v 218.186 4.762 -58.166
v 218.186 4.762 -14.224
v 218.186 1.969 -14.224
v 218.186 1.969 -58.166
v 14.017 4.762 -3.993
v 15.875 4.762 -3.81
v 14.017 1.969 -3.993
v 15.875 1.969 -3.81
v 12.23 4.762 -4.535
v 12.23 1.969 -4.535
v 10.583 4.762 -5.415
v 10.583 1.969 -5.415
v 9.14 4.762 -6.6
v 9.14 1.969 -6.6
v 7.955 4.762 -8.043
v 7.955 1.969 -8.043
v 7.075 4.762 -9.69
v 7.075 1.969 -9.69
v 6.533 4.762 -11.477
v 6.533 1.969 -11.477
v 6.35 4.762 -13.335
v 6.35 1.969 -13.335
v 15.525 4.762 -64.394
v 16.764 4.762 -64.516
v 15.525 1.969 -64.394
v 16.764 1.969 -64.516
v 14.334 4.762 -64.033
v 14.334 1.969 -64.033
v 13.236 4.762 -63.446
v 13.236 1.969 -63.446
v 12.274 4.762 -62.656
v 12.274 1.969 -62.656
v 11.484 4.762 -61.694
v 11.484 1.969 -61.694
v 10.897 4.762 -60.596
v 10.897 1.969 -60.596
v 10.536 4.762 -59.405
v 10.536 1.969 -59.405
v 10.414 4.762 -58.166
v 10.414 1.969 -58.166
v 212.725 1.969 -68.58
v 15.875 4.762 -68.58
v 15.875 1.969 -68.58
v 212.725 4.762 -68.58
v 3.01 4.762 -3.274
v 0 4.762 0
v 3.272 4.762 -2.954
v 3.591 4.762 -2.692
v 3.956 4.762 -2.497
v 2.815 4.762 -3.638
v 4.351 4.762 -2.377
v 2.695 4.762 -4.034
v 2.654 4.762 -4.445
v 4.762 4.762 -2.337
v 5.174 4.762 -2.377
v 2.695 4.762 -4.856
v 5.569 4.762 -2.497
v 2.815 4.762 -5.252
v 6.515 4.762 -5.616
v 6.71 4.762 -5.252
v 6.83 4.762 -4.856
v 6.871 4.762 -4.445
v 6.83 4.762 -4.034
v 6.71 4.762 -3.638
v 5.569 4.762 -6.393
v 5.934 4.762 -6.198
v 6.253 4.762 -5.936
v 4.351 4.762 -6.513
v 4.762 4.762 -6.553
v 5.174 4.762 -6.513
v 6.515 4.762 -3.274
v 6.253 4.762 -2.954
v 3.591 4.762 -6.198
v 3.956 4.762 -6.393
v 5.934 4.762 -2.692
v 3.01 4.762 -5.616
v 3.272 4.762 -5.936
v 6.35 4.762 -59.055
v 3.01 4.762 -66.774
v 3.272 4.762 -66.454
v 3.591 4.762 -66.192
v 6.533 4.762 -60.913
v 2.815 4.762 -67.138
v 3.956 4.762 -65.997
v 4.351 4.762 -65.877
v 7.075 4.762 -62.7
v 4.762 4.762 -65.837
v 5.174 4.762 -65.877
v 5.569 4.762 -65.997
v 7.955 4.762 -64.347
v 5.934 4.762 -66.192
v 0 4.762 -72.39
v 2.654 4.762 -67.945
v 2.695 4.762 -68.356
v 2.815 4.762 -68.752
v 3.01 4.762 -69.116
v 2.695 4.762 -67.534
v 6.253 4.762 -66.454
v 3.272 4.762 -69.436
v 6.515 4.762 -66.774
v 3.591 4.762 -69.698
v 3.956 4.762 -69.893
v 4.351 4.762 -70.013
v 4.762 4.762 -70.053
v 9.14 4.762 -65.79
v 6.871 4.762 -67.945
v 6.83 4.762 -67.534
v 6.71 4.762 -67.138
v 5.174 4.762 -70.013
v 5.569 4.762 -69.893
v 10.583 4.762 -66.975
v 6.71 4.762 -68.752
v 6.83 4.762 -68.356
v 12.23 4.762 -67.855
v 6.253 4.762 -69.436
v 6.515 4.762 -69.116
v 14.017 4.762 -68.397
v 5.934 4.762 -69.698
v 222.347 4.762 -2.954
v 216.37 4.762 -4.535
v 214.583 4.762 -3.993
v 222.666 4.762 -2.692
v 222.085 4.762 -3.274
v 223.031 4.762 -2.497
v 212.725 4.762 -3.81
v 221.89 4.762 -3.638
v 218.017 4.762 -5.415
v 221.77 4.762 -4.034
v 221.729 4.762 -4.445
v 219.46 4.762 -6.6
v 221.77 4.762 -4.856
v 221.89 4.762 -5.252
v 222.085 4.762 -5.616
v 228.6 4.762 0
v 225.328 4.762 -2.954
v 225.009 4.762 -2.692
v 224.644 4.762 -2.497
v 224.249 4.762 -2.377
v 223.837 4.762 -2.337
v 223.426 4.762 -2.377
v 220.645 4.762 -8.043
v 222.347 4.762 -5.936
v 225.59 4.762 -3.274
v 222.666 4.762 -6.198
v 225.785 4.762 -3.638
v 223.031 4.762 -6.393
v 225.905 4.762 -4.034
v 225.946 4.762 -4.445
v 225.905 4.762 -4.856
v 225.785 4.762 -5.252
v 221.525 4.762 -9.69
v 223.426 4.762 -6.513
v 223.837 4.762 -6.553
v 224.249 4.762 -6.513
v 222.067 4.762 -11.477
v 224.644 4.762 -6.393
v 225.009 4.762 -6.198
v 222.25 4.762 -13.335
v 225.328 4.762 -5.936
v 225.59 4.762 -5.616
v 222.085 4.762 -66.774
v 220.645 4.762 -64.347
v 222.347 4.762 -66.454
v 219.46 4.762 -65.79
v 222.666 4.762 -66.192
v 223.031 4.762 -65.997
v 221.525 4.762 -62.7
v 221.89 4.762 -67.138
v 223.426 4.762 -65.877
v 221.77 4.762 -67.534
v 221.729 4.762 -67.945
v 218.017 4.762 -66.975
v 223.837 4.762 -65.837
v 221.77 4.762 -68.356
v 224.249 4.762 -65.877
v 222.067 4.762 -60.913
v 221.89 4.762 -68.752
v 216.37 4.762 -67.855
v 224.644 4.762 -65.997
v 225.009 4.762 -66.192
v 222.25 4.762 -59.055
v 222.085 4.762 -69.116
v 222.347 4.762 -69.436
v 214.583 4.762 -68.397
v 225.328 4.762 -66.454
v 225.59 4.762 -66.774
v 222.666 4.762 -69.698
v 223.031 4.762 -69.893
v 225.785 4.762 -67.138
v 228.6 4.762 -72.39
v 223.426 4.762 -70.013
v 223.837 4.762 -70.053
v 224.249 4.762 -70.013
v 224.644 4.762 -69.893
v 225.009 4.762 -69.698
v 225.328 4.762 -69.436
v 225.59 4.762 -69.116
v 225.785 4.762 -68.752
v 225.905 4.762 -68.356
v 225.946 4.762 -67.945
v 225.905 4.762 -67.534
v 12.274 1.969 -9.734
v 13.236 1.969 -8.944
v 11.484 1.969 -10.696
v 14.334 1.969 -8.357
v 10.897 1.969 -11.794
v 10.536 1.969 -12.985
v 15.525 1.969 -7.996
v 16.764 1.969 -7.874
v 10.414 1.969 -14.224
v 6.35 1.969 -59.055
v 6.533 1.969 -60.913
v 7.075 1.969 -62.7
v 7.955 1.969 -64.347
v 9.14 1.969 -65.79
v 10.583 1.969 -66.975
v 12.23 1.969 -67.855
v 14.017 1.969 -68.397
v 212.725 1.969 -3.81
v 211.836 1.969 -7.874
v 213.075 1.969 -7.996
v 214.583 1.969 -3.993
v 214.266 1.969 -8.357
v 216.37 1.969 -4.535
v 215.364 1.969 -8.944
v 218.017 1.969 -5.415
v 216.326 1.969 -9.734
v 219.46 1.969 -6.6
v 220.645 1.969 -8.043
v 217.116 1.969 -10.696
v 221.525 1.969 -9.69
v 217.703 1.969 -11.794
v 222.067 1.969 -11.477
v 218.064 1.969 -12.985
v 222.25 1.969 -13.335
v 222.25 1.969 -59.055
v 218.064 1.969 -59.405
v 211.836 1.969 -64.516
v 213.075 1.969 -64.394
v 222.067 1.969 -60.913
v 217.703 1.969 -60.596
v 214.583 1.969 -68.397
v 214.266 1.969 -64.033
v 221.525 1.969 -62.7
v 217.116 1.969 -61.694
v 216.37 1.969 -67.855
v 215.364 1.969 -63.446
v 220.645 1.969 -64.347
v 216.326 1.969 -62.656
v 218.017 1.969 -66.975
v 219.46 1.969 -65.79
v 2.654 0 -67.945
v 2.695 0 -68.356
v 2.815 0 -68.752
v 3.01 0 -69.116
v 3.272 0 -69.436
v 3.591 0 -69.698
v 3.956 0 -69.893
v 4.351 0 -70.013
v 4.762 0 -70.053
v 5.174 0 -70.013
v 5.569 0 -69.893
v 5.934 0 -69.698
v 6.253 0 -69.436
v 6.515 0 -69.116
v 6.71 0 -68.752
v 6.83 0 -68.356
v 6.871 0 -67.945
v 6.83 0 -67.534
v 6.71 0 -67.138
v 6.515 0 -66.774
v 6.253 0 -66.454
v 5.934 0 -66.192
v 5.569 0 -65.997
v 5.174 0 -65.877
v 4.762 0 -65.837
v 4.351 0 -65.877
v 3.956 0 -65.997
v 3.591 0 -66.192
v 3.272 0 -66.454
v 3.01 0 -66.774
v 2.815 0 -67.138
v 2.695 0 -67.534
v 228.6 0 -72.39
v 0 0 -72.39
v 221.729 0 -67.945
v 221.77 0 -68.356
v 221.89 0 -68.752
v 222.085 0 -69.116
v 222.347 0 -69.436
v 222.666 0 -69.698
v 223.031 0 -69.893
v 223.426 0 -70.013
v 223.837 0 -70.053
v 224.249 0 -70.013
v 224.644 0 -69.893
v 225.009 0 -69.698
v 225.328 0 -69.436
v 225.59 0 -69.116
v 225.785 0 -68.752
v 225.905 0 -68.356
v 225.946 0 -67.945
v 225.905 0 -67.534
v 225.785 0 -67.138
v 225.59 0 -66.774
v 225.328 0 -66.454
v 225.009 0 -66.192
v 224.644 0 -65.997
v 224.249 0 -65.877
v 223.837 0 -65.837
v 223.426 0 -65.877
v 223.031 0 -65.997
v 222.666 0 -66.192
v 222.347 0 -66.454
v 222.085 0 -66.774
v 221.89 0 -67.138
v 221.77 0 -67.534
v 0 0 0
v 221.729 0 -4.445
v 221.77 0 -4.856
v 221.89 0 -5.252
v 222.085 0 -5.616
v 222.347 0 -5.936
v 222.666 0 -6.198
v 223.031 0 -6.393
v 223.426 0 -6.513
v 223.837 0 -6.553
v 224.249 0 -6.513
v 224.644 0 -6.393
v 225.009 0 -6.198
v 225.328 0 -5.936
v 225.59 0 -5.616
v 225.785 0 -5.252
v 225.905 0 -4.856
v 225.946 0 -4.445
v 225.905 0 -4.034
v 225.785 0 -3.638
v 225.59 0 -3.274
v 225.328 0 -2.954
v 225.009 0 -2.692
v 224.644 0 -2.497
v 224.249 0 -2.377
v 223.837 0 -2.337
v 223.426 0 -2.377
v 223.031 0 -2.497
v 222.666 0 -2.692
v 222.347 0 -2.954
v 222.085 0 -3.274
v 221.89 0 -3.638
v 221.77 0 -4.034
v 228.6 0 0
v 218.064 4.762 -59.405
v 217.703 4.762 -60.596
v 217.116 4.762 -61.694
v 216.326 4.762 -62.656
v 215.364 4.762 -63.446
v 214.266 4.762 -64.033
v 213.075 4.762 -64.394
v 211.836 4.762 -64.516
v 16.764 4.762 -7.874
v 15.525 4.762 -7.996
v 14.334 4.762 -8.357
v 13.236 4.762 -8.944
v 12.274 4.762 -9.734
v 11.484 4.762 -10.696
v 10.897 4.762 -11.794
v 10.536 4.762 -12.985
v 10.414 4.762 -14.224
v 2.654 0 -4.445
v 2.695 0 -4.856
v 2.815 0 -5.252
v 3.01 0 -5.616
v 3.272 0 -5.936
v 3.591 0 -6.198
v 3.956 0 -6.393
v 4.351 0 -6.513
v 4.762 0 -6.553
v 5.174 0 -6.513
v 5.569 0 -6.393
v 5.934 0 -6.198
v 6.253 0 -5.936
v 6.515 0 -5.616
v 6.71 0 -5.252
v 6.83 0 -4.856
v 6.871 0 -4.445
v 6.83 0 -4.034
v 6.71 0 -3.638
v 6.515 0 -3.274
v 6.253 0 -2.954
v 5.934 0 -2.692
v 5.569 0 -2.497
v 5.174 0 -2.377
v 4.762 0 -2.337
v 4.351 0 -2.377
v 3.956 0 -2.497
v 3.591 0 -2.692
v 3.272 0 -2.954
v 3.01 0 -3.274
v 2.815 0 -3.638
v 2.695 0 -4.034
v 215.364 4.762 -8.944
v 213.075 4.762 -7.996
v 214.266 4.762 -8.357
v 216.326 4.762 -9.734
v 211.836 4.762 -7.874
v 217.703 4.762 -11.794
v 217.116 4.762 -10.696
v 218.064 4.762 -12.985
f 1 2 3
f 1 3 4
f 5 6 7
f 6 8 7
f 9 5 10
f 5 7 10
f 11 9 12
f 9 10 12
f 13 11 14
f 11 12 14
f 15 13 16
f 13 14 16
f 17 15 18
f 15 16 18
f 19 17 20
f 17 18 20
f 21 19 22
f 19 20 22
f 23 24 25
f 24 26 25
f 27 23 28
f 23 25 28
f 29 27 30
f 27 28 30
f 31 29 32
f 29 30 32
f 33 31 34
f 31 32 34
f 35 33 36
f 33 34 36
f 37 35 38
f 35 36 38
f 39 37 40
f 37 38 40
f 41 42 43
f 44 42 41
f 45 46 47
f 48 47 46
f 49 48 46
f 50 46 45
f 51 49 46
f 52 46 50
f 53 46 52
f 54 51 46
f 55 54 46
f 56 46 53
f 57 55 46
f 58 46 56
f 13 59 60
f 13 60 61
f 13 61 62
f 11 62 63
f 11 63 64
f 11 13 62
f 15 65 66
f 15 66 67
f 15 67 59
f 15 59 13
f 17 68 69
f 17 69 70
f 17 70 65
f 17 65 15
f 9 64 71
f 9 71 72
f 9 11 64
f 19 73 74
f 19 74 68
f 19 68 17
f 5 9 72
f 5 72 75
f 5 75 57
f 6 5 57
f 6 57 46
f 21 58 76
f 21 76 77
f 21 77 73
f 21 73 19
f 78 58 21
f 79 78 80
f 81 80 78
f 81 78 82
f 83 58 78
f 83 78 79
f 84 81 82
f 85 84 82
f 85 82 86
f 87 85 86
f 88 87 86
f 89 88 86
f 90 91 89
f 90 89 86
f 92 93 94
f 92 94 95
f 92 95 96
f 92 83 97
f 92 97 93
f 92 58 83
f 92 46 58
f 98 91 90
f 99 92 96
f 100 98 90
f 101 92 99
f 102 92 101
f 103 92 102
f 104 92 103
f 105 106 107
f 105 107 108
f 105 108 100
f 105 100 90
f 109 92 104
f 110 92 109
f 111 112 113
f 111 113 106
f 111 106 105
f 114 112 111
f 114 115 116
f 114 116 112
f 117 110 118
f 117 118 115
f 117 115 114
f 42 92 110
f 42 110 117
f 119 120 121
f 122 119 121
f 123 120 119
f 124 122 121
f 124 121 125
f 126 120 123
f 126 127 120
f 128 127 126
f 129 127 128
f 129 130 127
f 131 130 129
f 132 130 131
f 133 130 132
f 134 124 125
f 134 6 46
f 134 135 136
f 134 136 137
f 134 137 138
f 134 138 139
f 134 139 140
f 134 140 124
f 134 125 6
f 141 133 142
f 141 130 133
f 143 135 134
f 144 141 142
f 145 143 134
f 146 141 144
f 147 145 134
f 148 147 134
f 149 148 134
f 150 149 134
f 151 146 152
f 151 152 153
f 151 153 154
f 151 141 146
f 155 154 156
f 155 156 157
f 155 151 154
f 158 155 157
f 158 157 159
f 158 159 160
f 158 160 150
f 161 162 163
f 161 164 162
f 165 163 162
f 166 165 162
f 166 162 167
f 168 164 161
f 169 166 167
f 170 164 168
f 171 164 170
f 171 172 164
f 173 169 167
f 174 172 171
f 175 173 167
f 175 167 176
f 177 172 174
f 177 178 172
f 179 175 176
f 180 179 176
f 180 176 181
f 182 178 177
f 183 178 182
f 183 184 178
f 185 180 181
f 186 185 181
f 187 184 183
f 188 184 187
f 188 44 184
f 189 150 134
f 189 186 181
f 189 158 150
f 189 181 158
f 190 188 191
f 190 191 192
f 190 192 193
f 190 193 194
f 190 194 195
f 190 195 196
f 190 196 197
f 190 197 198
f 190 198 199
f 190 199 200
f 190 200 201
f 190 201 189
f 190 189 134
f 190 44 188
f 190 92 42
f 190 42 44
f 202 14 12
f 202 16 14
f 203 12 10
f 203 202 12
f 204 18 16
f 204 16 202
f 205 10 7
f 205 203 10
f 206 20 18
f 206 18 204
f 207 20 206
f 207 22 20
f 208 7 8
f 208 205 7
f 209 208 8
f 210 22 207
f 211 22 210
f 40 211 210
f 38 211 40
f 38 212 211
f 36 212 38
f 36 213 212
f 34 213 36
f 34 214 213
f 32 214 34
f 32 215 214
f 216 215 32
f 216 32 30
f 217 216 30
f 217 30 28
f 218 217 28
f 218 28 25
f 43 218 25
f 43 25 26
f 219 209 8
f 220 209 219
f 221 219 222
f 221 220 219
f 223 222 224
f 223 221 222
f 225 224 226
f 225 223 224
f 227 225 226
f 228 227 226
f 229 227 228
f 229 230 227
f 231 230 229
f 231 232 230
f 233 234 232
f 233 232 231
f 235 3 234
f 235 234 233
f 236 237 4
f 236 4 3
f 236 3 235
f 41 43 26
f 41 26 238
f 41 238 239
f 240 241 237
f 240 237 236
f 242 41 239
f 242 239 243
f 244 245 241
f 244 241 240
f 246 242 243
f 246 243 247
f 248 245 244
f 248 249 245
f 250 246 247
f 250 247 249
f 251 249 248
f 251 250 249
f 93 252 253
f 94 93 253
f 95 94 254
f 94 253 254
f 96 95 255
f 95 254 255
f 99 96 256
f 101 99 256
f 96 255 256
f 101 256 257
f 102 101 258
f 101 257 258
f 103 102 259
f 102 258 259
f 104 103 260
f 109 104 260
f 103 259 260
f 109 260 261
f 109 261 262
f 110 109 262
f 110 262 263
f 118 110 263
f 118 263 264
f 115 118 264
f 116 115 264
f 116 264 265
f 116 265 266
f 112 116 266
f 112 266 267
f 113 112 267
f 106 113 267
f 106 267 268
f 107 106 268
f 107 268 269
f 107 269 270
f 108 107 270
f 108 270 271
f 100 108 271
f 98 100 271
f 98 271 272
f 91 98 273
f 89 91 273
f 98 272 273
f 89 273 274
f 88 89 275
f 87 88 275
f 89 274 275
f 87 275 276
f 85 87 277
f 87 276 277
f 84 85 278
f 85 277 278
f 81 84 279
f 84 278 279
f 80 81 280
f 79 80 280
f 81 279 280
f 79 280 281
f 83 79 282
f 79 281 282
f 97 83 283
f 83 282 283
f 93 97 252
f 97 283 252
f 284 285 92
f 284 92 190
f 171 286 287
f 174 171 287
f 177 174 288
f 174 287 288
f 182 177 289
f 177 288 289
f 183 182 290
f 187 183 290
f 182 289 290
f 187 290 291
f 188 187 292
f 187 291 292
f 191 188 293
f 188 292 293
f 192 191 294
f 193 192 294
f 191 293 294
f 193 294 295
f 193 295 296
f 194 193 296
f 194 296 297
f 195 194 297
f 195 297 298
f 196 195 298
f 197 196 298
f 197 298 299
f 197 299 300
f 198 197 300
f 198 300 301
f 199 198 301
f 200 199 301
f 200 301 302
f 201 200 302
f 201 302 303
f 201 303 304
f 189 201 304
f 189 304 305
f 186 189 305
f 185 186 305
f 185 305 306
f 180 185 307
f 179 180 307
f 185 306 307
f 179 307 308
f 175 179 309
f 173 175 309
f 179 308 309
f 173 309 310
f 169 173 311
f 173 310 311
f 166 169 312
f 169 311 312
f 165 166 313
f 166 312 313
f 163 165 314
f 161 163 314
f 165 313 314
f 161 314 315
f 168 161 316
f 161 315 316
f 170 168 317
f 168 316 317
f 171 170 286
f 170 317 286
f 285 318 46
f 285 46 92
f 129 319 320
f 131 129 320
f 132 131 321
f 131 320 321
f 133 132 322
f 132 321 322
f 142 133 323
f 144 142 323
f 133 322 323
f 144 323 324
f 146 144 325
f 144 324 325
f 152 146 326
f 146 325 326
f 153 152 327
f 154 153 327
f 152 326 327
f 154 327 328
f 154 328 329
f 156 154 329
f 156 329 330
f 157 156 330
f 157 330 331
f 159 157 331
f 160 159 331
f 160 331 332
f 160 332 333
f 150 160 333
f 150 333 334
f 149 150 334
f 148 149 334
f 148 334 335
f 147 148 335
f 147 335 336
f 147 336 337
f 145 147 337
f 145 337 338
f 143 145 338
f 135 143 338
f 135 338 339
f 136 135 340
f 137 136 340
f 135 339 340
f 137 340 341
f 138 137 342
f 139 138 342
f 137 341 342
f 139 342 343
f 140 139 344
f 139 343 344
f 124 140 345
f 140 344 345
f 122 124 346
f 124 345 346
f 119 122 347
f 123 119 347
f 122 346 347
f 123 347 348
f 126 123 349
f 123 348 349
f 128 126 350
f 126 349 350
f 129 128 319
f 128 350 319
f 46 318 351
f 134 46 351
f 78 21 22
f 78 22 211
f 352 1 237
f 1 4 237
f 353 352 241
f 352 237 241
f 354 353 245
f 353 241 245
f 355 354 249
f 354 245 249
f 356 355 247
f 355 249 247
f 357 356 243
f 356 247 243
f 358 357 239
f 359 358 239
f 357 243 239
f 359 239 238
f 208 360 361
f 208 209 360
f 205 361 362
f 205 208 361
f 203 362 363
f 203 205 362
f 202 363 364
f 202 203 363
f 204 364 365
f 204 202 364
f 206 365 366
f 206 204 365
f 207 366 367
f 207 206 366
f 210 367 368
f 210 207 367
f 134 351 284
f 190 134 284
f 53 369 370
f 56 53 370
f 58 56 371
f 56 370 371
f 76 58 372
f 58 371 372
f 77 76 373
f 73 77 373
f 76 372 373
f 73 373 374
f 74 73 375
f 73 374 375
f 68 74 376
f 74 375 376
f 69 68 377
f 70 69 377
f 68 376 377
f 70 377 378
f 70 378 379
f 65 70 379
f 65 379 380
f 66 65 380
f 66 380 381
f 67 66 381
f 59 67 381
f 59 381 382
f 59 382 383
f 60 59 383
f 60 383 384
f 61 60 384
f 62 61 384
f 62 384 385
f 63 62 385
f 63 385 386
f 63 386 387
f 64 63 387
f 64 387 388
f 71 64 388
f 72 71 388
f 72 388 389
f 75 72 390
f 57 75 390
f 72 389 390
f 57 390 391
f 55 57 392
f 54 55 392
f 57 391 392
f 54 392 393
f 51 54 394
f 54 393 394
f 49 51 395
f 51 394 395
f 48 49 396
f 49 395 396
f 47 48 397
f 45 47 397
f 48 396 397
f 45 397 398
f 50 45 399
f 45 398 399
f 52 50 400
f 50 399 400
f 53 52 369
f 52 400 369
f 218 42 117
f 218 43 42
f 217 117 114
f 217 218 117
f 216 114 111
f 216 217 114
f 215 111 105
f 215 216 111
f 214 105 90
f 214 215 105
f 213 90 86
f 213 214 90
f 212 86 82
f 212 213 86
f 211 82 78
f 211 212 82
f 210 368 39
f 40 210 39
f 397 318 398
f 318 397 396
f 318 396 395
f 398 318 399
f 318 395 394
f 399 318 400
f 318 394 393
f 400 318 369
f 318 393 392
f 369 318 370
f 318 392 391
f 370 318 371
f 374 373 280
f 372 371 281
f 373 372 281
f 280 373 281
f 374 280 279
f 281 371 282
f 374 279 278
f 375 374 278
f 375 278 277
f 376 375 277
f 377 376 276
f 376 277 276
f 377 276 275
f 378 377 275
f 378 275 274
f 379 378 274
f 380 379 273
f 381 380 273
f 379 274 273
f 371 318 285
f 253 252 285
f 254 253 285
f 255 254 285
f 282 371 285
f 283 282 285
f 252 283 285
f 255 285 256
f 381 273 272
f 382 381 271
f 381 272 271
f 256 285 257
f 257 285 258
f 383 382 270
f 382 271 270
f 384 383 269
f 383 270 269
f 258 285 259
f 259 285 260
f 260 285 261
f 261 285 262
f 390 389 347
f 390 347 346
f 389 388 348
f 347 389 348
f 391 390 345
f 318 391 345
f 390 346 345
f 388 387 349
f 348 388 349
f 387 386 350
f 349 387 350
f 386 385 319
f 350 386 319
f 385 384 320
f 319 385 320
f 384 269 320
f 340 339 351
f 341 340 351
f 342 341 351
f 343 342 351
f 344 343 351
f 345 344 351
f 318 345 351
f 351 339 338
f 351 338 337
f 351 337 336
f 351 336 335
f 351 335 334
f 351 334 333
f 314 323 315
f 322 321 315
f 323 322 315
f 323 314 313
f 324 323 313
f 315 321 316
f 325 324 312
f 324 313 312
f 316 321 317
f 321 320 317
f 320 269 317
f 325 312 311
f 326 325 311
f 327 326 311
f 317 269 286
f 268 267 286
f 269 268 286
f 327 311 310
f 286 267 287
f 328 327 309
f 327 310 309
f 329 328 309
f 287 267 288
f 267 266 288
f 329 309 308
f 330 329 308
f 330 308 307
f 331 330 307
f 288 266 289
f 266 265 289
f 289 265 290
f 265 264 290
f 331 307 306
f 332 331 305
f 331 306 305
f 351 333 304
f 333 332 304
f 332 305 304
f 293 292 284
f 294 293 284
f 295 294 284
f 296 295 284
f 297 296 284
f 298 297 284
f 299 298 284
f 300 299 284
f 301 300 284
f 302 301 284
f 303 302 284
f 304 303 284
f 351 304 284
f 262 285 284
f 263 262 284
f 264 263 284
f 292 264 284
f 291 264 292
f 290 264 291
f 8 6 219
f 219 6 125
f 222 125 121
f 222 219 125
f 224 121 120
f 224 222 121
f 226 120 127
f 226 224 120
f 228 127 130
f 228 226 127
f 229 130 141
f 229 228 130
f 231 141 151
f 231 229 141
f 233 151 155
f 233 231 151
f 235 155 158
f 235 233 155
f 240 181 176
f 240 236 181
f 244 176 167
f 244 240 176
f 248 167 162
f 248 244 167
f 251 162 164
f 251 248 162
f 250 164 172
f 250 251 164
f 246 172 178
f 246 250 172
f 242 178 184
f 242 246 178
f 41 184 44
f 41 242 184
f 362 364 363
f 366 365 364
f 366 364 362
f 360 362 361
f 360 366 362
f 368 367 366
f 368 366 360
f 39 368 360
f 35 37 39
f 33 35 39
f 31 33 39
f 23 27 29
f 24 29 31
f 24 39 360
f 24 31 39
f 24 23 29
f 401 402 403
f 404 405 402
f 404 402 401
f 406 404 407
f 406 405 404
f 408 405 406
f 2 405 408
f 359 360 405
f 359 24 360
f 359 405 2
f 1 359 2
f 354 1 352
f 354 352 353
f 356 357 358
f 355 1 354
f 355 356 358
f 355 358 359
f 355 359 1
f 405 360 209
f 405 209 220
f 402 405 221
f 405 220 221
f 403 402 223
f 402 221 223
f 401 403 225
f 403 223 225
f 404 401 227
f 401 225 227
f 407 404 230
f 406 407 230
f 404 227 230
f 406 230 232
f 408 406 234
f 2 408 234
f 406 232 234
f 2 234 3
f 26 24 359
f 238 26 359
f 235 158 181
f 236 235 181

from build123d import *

# Parameters (mm, degrees)
SKETCH1_W                   = 228.6
SKETCH1_H                   = 72.39
BOSS_EXTRUDE1_DEPTH         = 4.7625
SKETCH2_W                   = 215.9
SKETCH2_H                   = 64.77
SKETCH2_W_2                 = 207.772
SKETCH2_H_2                 = 56.642
CUT_EXTRUDE1_DEPTH          = 2.794
FILLET1_R                   = 9.525
FILLET2_R                   = 6.35
F_19_0_166_DIAMETER_HOLE1_D = 4.2164
LPATTERN1_COUNT             = 2
LPATTERN1_PITCH             = 219.075
LPATTERN1_COUNT_DIR2        = 2
LPATTERN1_PITCH_DIR2        = 63.5


with BuildPart() as part:
    # Sketch1 → Boss-Extrude1 (new body)
    with BuildSketch(Plane(origin=(0, 0, 0), x_dir=(1, 0, 0), z_dir=(0, 1, 0))):
        with Locations((114.3, 36.195)):
            Rectangle(SKETCH1_W, SKETCH1_H)
    extrude(amount=BOSS_EXTRUDE1_DEPTH)

    # Sketch2 → Cut-Extrude1 (cut)
    with BuildSketch(Plane(origin=(0, 4.7625, 0), x_dir=(1, 0, 0), z_dir=(0, 1, 0))):
        with Locations((114.3, 36.195)):
            Rectangle(SKETCH2_W, SKETCH2_H)
        with Locations((114.3, 36.195)):
            Rectangle(SKETCH2_W_2, SKETCH2_H_2, mode=Mode.SUBTRACT)
    extrude(amount=-CUT_EXTRUDE1_DEPTH, mode=Mode.SUBTRACT)

    # Fillet1
    fillet1_edges = [part.edges().sort_by_distance(p)[0] for p in [
        (6.35, 3.3655, -3.81),
        (6.35, 3.3655, -68.58),
        (222.25, 3.3655, -68.58),
        (222.25, 3.3655, -3.81),
    ]]
    fillet(fillet1_edges, radius=FILLET1_R)

    # Fillet2
    fillet2_edges = [part.edges().sort_by_distance(p)[0] for p in [
        (10.414, 3.3655, -64.516),
        (218.186, 3.3655, -64.516),
        (218.186, 3.3655, -7.874),
        (10.414, 3.3655, -7.874),
    ]]
    fillet(fillet2_edges, radius=FILLET2_R)

    # #19 (0.166) Diameter Hole1 (through all)
    with Locations(Plane(origin=(0, 4.7625, 0), x_dir=(1, 0, 0), z_dir=(0, 1, 0))):
        with Locations((4.7625, 4.445)):
            f_19_0_166_diameter_hole1 = Hole(F_19_0_166_DIAMETER_HOLE1_D / 2)

    # LPattern1: 19 _0.166_ Diameter Hole1 2 × 2
    with Locations(*[(i * LPATTERN1_PITCH, 0, -j * LPATTERN1_PITCH_DIR2) for i in range(LPATTERN1_COUNT) for j in range(LPATTERN1_COUNT_DIR2) if (i, j) != (0, 0)]):
        add(f_19_0_166_diameter_hole1, mode=Mode.SUBTRACT)


solid = part.part
